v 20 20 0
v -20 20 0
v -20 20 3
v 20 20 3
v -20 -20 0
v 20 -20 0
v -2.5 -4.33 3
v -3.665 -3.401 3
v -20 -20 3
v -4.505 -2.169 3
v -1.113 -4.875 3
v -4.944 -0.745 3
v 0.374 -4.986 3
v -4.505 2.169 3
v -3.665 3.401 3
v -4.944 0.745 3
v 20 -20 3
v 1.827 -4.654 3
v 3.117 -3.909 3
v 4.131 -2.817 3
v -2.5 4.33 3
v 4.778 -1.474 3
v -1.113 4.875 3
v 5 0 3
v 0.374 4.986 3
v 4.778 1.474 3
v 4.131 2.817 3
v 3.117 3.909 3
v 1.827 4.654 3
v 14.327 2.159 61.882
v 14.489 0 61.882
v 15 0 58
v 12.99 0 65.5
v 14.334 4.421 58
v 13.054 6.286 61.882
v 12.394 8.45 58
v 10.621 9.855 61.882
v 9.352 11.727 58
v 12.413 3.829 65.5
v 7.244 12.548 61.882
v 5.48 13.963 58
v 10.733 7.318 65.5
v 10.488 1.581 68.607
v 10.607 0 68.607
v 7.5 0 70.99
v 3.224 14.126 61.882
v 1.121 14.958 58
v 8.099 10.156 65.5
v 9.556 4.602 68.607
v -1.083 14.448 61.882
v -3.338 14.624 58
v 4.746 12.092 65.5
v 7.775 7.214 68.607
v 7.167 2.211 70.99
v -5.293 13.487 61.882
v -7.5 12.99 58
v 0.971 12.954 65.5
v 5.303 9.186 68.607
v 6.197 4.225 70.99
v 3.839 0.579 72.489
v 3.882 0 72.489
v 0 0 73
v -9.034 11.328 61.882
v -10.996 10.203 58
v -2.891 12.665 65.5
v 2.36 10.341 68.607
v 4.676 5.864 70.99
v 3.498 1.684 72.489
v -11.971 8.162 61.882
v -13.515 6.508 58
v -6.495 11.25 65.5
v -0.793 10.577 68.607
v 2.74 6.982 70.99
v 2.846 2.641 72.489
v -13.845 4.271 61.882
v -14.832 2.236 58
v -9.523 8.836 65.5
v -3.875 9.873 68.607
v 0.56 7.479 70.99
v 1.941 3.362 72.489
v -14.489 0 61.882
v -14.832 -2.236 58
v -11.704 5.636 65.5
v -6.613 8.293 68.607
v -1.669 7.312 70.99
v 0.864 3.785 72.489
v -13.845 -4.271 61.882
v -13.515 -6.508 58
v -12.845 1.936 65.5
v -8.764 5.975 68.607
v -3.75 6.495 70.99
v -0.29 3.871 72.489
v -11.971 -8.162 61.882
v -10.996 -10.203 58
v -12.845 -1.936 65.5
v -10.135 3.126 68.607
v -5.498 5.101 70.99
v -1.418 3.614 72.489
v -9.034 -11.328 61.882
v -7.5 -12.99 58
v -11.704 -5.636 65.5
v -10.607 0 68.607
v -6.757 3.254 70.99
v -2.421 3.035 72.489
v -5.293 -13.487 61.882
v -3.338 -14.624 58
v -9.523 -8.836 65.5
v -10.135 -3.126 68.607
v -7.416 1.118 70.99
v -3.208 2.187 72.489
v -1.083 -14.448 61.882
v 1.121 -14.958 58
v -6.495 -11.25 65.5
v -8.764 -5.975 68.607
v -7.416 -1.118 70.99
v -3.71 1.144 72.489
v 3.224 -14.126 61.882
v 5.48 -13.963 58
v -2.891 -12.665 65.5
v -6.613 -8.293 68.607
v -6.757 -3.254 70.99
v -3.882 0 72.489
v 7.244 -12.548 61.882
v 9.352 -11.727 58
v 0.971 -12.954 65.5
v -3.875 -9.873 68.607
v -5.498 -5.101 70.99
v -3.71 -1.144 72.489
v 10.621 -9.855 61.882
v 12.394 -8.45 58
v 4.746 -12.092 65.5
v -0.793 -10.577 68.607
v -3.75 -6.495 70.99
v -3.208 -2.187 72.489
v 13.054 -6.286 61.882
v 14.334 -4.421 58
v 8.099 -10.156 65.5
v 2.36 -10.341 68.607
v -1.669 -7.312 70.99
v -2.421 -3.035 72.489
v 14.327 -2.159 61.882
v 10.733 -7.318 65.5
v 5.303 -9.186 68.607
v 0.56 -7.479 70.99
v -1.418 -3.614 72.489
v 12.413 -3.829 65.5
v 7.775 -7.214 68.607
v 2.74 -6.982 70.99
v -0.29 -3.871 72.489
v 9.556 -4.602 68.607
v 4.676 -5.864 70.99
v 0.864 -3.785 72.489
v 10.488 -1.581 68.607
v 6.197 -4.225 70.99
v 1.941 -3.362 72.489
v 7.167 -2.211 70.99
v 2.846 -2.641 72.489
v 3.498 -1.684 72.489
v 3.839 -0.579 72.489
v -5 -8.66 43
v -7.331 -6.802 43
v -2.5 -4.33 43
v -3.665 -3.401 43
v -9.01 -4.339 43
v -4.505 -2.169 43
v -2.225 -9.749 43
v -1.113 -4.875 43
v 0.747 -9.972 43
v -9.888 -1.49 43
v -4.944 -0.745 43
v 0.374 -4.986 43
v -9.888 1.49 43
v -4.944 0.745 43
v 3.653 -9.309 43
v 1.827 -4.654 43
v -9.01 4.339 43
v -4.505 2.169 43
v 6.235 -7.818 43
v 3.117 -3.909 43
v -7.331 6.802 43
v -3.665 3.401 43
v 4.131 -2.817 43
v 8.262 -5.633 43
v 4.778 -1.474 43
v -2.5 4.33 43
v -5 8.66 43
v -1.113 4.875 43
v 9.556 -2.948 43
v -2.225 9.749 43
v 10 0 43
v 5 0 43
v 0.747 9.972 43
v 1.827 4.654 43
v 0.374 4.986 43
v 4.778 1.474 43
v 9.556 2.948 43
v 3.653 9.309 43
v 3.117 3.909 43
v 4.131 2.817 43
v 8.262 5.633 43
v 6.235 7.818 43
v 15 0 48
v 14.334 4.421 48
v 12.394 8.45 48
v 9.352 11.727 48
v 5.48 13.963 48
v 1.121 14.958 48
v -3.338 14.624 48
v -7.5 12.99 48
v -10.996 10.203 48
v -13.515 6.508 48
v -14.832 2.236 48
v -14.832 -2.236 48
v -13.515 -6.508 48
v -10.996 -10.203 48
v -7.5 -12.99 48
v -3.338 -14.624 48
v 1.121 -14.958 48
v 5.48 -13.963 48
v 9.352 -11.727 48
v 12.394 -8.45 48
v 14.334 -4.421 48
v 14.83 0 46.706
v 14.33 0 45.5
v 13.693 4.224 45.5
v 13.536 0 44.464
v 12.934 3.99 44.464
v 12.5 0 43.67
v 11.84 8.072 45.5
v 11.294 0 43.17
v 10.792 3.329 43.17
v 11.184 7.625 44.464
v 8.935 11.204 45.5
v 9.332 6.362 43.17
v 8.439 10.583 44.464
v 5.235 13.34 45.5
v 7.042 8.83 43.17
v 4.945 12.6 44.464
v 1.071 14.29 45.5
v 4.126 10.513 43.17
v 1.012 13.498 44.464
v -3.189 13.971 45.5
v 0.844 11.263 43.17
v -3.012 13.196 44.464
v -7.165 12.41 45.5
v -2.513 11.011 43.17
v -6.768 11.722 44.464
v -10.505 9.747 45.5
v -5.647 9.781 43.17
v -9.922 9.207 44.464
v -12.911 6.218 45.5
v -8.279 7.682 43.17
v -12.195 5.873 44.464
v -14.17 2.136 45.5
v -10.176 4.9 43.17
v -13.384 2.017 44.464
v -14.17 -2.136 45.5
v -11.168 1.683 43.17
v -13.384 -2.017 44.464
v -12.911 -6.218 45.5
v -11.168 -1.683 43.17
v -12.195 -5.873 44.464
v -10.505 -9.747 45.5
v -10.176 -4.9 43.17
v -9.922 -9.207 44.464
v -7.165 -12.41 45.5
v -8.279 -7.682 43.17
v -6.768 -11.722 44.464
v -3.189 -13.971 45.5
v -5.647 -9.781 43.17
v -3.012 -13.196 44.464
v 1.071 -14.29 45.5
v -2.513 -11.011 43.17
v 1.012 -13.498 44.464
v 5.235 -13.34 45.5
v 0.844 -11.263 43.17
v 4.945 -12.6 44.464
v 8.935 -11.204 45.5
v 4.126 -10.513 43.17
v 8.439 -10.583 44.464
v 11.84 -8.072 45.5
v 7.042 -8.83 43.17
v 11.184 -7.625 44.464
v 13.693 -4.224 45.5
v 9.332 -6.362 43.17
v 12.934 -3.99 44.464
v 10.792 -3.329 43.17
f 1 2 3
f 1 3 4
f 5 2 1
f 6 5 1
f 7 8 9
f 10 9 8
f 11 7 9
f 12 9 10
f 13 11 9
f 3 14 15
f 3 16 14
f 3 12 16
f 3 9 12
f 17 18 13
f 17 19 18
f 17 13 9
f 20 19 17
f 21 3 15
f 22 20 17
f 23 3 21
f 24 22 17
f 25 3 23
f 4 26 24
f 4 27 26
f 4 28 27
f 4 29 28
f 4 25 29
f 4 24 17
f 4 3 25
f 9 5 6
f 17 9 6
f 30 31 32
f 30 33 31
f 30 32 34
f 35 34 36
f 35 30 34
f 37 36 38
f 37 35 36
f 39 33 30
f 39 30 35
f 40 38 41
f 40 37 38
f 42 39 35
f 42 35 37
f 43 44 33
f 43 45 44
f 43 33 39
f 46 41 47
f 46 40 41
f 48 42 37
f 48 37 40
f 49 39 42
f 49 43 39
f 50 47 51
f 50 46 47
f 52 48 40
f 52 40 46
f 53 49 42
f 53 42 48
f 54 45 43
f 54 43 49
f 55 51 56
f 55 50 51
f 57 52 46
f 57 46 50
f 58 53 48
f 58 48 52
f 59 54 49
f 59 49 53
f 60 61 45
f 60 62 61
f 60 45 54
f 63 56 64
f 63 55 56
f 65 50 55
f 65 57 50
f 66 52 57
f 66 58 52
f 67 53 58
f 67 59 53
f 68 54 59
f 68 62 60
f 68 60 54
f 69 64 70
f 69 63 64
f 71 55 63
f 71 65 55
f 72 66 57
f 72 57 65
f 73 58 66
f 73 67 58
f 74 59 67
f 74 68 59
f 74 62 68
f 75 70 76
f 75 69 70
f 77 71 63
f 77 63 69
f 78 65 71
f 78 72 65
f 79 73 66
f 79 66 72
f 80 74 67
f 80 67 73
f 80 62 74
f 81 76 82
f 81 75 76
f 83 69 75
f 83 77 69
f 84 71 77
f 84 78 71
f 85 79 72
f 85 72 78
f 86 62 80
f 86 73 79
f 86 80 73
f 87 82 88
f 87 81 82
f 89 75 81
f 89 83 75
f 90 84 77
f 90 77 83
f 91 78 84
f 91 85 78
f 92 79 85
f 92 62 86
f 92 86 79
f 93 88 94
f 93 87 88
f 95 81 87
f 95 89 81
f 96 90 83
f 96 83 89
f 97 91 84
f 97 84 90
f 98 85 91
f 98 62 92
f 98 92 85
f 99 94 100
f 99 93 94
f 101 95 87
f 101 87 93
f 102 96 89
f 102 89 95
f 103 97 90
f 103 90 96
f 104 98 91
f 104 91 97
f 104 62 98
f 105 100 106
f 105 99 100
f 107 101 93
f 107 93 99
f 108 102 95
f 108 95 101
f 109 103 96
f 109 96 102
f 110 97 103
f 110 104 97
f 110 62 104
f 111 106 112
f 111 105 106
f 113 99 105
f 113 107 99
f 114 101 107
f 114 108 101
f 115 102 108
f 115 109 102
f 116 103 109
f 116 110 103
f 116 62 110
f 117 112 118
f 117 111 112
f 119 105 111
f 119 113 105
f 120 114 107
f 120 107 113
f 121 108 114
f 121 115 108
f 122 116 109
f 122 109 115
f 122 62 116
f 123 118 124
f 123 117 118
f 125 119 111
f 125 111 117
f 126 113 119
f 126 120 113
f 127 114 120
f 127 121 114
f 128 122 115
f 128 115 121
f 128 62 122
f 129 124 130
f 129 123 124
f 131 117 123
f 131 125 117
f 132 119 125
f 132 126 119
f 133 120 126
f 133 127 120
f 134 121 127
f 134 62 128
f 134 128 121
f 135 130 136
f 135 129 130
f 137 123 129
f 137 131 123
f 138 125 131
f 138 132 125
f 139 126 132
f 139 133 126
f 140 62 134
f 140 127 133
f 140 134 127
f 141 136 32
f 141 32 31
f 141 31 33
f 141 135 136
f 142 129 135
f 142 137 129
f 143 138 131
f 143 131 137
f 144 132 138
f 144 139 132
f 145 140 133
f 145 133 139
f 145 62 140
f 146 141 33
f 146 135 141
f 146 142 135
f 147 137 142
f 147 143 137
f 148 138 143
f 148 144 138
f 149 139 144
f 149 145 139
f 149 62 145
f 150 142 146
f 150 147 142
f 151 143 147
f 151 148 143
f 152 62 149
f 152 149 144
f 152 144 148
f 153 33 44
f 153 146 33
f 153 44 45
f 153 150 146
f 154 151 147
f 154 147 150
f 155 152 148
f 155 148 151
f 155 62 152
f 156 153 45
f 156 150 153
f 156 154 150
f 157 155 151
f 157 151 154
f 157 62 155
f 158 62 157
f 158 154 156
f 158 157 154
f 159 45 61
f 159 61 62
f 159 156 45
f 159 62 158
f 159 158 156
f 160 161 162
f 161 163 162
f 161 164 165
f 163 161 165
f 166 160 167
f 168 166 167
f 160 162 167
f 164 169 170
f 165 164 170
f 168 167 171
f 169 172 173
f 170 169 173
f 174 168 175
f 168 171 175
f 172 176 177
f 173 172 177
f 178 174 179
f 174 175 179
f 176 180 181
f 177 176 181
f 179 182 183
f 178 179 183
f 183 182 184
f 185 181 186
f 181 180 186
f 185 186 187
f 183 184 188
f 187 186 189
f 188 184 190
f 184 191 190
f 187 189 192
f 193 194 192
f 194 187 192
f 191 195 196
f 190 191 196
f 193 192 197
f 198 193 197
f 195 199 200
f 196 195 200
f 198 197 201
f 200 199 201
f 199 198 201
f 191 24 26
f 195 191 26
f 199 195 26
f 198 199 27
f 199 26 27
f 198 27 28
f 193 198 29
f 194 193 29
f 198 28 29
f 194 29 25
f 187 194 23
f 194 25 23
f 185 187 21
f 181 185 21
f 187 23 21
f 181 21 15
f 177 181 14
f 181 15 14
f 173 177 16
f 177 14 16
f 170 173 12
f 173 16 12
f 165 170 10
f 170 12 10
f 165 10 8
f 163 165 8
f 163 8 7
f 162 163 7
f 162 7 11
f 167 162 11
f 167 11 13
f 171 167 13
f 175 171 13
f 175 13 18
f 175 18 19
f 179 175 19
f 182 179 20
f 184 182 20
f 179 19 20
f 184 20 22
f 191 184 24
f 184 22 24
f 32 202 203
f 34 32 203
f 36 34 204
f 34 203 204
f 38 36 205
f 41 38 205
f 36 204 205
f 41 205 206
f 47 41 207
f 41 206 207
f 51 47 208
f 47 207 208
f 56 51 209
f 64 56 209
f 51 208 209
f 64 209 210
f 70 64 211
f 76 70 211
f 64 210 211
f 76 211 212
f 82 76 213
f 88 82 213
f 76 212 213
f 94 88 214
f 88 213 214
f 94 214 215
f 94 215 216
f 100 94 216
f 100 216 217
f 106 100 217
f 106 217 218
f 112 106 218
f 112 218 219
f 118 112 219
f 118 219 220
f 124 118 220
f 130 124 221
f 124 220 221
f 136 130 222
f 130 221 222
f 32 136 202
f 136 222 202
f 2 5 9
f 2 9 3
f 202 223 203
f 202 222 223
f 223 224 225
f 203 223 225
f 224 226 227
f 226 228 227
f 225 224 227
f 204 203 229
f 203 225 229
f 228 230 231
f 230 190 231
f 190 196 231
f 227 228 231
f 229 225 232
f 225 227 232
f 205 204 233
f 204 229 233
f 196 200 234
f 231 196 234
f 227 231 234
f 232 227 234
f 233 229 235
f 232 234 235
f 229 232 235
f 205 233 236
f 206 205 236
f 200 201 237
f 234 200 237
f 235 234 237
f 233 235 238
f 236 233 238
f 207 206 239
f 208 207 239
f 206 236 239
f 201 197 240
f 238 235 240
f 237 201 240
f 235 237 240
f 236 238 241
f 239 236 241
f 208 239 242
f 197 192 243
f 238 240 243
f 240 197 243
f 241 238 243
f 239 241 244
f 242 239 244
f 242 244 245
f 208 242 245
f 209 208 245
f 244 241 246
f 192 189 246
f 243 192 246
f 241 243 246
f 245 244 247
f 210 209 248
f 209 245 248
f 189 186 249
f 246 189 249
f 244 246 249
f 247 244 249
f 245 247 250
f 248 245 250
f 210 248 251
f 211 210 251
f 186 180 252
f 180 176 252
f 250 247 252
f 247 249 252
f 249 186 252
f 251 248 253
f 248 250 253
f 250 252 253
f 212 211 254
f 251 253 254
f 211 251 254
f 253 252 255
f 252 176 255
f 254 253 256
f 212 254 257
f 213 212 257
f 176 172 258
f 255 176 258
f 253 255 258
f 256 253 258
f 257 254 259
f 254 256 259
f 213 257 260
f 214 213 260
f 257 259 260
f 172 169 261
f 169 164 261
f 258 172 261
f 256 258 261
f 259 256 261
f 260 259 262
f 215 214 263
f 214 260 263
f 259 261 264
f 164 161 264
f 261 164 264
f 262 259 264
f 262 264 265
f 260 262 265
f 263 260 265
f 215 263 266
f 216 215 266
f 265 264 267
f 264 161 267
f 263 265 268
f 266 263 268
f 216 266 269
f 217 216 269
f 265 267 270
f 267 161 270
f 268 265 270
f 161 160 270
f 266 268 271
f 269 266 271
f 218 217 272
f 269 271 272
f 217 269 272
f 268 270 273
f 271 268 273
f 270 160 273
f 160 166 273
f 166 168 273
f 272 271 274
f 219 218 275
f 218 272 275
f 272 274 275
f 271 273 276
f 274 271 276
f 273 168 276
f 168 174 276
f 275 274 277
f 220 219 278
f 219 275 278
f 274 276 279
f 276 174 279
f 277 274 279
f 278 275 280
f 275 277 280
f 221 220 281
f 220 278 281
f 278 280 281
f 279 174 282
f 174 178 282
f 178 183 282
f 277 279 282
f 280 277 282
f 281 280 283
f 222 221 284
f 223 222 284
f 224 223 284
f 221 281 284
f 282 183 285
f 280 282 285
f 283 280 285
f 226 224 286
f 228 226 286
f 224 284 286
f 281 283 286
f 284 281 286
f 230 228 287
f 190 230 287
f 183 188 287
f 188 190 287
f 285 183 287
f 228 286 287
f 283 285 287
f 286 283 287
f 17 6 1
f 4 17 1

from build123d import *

# Parameters (mm, degrees)
F0_W     = 40
F0_H     = 40
F1_DEPTH = 3
F2_R     = 5
F3_DEPTH = 40
F4_R     = 15
F5_DEPTH = 30
F6_R     = 15
F7_R     = 5


with BuildPart() as f1:
    # F0 (on Top) → F1 (new body)
    with BuildSketch(Plane.XY):
        Rectangle(F0_W, F0_H)
    extrude(amount=F1_DEPTH)

    # F2 (on face) → F3 (join)
    with BuildSketch(Plane.XY.offset(3)):
        Circle(F2_R)
    extrude(amount=F3_DEPTH)

    # F4 (on face) → F5 (join)
    with BuildSketch(Plane.XY.offset(43)):
        Circle(F4_R)
    extrude(amount=F5_DEPTH)

    # F6
    f6_edges = [f1.edges().sort_by_distance(p)[0] for p in [
        (-15, 0, 73),
    ]]
    fillet(f6_edges, radius=F6_R)

    # F7
    f7_edges = [f1.edges().sort_by_distance(p)[0] for p in [
        (-15, 0, 43),
    ]]
    fillet(f7_edges, radius=F7_R)


solid = f1.part
